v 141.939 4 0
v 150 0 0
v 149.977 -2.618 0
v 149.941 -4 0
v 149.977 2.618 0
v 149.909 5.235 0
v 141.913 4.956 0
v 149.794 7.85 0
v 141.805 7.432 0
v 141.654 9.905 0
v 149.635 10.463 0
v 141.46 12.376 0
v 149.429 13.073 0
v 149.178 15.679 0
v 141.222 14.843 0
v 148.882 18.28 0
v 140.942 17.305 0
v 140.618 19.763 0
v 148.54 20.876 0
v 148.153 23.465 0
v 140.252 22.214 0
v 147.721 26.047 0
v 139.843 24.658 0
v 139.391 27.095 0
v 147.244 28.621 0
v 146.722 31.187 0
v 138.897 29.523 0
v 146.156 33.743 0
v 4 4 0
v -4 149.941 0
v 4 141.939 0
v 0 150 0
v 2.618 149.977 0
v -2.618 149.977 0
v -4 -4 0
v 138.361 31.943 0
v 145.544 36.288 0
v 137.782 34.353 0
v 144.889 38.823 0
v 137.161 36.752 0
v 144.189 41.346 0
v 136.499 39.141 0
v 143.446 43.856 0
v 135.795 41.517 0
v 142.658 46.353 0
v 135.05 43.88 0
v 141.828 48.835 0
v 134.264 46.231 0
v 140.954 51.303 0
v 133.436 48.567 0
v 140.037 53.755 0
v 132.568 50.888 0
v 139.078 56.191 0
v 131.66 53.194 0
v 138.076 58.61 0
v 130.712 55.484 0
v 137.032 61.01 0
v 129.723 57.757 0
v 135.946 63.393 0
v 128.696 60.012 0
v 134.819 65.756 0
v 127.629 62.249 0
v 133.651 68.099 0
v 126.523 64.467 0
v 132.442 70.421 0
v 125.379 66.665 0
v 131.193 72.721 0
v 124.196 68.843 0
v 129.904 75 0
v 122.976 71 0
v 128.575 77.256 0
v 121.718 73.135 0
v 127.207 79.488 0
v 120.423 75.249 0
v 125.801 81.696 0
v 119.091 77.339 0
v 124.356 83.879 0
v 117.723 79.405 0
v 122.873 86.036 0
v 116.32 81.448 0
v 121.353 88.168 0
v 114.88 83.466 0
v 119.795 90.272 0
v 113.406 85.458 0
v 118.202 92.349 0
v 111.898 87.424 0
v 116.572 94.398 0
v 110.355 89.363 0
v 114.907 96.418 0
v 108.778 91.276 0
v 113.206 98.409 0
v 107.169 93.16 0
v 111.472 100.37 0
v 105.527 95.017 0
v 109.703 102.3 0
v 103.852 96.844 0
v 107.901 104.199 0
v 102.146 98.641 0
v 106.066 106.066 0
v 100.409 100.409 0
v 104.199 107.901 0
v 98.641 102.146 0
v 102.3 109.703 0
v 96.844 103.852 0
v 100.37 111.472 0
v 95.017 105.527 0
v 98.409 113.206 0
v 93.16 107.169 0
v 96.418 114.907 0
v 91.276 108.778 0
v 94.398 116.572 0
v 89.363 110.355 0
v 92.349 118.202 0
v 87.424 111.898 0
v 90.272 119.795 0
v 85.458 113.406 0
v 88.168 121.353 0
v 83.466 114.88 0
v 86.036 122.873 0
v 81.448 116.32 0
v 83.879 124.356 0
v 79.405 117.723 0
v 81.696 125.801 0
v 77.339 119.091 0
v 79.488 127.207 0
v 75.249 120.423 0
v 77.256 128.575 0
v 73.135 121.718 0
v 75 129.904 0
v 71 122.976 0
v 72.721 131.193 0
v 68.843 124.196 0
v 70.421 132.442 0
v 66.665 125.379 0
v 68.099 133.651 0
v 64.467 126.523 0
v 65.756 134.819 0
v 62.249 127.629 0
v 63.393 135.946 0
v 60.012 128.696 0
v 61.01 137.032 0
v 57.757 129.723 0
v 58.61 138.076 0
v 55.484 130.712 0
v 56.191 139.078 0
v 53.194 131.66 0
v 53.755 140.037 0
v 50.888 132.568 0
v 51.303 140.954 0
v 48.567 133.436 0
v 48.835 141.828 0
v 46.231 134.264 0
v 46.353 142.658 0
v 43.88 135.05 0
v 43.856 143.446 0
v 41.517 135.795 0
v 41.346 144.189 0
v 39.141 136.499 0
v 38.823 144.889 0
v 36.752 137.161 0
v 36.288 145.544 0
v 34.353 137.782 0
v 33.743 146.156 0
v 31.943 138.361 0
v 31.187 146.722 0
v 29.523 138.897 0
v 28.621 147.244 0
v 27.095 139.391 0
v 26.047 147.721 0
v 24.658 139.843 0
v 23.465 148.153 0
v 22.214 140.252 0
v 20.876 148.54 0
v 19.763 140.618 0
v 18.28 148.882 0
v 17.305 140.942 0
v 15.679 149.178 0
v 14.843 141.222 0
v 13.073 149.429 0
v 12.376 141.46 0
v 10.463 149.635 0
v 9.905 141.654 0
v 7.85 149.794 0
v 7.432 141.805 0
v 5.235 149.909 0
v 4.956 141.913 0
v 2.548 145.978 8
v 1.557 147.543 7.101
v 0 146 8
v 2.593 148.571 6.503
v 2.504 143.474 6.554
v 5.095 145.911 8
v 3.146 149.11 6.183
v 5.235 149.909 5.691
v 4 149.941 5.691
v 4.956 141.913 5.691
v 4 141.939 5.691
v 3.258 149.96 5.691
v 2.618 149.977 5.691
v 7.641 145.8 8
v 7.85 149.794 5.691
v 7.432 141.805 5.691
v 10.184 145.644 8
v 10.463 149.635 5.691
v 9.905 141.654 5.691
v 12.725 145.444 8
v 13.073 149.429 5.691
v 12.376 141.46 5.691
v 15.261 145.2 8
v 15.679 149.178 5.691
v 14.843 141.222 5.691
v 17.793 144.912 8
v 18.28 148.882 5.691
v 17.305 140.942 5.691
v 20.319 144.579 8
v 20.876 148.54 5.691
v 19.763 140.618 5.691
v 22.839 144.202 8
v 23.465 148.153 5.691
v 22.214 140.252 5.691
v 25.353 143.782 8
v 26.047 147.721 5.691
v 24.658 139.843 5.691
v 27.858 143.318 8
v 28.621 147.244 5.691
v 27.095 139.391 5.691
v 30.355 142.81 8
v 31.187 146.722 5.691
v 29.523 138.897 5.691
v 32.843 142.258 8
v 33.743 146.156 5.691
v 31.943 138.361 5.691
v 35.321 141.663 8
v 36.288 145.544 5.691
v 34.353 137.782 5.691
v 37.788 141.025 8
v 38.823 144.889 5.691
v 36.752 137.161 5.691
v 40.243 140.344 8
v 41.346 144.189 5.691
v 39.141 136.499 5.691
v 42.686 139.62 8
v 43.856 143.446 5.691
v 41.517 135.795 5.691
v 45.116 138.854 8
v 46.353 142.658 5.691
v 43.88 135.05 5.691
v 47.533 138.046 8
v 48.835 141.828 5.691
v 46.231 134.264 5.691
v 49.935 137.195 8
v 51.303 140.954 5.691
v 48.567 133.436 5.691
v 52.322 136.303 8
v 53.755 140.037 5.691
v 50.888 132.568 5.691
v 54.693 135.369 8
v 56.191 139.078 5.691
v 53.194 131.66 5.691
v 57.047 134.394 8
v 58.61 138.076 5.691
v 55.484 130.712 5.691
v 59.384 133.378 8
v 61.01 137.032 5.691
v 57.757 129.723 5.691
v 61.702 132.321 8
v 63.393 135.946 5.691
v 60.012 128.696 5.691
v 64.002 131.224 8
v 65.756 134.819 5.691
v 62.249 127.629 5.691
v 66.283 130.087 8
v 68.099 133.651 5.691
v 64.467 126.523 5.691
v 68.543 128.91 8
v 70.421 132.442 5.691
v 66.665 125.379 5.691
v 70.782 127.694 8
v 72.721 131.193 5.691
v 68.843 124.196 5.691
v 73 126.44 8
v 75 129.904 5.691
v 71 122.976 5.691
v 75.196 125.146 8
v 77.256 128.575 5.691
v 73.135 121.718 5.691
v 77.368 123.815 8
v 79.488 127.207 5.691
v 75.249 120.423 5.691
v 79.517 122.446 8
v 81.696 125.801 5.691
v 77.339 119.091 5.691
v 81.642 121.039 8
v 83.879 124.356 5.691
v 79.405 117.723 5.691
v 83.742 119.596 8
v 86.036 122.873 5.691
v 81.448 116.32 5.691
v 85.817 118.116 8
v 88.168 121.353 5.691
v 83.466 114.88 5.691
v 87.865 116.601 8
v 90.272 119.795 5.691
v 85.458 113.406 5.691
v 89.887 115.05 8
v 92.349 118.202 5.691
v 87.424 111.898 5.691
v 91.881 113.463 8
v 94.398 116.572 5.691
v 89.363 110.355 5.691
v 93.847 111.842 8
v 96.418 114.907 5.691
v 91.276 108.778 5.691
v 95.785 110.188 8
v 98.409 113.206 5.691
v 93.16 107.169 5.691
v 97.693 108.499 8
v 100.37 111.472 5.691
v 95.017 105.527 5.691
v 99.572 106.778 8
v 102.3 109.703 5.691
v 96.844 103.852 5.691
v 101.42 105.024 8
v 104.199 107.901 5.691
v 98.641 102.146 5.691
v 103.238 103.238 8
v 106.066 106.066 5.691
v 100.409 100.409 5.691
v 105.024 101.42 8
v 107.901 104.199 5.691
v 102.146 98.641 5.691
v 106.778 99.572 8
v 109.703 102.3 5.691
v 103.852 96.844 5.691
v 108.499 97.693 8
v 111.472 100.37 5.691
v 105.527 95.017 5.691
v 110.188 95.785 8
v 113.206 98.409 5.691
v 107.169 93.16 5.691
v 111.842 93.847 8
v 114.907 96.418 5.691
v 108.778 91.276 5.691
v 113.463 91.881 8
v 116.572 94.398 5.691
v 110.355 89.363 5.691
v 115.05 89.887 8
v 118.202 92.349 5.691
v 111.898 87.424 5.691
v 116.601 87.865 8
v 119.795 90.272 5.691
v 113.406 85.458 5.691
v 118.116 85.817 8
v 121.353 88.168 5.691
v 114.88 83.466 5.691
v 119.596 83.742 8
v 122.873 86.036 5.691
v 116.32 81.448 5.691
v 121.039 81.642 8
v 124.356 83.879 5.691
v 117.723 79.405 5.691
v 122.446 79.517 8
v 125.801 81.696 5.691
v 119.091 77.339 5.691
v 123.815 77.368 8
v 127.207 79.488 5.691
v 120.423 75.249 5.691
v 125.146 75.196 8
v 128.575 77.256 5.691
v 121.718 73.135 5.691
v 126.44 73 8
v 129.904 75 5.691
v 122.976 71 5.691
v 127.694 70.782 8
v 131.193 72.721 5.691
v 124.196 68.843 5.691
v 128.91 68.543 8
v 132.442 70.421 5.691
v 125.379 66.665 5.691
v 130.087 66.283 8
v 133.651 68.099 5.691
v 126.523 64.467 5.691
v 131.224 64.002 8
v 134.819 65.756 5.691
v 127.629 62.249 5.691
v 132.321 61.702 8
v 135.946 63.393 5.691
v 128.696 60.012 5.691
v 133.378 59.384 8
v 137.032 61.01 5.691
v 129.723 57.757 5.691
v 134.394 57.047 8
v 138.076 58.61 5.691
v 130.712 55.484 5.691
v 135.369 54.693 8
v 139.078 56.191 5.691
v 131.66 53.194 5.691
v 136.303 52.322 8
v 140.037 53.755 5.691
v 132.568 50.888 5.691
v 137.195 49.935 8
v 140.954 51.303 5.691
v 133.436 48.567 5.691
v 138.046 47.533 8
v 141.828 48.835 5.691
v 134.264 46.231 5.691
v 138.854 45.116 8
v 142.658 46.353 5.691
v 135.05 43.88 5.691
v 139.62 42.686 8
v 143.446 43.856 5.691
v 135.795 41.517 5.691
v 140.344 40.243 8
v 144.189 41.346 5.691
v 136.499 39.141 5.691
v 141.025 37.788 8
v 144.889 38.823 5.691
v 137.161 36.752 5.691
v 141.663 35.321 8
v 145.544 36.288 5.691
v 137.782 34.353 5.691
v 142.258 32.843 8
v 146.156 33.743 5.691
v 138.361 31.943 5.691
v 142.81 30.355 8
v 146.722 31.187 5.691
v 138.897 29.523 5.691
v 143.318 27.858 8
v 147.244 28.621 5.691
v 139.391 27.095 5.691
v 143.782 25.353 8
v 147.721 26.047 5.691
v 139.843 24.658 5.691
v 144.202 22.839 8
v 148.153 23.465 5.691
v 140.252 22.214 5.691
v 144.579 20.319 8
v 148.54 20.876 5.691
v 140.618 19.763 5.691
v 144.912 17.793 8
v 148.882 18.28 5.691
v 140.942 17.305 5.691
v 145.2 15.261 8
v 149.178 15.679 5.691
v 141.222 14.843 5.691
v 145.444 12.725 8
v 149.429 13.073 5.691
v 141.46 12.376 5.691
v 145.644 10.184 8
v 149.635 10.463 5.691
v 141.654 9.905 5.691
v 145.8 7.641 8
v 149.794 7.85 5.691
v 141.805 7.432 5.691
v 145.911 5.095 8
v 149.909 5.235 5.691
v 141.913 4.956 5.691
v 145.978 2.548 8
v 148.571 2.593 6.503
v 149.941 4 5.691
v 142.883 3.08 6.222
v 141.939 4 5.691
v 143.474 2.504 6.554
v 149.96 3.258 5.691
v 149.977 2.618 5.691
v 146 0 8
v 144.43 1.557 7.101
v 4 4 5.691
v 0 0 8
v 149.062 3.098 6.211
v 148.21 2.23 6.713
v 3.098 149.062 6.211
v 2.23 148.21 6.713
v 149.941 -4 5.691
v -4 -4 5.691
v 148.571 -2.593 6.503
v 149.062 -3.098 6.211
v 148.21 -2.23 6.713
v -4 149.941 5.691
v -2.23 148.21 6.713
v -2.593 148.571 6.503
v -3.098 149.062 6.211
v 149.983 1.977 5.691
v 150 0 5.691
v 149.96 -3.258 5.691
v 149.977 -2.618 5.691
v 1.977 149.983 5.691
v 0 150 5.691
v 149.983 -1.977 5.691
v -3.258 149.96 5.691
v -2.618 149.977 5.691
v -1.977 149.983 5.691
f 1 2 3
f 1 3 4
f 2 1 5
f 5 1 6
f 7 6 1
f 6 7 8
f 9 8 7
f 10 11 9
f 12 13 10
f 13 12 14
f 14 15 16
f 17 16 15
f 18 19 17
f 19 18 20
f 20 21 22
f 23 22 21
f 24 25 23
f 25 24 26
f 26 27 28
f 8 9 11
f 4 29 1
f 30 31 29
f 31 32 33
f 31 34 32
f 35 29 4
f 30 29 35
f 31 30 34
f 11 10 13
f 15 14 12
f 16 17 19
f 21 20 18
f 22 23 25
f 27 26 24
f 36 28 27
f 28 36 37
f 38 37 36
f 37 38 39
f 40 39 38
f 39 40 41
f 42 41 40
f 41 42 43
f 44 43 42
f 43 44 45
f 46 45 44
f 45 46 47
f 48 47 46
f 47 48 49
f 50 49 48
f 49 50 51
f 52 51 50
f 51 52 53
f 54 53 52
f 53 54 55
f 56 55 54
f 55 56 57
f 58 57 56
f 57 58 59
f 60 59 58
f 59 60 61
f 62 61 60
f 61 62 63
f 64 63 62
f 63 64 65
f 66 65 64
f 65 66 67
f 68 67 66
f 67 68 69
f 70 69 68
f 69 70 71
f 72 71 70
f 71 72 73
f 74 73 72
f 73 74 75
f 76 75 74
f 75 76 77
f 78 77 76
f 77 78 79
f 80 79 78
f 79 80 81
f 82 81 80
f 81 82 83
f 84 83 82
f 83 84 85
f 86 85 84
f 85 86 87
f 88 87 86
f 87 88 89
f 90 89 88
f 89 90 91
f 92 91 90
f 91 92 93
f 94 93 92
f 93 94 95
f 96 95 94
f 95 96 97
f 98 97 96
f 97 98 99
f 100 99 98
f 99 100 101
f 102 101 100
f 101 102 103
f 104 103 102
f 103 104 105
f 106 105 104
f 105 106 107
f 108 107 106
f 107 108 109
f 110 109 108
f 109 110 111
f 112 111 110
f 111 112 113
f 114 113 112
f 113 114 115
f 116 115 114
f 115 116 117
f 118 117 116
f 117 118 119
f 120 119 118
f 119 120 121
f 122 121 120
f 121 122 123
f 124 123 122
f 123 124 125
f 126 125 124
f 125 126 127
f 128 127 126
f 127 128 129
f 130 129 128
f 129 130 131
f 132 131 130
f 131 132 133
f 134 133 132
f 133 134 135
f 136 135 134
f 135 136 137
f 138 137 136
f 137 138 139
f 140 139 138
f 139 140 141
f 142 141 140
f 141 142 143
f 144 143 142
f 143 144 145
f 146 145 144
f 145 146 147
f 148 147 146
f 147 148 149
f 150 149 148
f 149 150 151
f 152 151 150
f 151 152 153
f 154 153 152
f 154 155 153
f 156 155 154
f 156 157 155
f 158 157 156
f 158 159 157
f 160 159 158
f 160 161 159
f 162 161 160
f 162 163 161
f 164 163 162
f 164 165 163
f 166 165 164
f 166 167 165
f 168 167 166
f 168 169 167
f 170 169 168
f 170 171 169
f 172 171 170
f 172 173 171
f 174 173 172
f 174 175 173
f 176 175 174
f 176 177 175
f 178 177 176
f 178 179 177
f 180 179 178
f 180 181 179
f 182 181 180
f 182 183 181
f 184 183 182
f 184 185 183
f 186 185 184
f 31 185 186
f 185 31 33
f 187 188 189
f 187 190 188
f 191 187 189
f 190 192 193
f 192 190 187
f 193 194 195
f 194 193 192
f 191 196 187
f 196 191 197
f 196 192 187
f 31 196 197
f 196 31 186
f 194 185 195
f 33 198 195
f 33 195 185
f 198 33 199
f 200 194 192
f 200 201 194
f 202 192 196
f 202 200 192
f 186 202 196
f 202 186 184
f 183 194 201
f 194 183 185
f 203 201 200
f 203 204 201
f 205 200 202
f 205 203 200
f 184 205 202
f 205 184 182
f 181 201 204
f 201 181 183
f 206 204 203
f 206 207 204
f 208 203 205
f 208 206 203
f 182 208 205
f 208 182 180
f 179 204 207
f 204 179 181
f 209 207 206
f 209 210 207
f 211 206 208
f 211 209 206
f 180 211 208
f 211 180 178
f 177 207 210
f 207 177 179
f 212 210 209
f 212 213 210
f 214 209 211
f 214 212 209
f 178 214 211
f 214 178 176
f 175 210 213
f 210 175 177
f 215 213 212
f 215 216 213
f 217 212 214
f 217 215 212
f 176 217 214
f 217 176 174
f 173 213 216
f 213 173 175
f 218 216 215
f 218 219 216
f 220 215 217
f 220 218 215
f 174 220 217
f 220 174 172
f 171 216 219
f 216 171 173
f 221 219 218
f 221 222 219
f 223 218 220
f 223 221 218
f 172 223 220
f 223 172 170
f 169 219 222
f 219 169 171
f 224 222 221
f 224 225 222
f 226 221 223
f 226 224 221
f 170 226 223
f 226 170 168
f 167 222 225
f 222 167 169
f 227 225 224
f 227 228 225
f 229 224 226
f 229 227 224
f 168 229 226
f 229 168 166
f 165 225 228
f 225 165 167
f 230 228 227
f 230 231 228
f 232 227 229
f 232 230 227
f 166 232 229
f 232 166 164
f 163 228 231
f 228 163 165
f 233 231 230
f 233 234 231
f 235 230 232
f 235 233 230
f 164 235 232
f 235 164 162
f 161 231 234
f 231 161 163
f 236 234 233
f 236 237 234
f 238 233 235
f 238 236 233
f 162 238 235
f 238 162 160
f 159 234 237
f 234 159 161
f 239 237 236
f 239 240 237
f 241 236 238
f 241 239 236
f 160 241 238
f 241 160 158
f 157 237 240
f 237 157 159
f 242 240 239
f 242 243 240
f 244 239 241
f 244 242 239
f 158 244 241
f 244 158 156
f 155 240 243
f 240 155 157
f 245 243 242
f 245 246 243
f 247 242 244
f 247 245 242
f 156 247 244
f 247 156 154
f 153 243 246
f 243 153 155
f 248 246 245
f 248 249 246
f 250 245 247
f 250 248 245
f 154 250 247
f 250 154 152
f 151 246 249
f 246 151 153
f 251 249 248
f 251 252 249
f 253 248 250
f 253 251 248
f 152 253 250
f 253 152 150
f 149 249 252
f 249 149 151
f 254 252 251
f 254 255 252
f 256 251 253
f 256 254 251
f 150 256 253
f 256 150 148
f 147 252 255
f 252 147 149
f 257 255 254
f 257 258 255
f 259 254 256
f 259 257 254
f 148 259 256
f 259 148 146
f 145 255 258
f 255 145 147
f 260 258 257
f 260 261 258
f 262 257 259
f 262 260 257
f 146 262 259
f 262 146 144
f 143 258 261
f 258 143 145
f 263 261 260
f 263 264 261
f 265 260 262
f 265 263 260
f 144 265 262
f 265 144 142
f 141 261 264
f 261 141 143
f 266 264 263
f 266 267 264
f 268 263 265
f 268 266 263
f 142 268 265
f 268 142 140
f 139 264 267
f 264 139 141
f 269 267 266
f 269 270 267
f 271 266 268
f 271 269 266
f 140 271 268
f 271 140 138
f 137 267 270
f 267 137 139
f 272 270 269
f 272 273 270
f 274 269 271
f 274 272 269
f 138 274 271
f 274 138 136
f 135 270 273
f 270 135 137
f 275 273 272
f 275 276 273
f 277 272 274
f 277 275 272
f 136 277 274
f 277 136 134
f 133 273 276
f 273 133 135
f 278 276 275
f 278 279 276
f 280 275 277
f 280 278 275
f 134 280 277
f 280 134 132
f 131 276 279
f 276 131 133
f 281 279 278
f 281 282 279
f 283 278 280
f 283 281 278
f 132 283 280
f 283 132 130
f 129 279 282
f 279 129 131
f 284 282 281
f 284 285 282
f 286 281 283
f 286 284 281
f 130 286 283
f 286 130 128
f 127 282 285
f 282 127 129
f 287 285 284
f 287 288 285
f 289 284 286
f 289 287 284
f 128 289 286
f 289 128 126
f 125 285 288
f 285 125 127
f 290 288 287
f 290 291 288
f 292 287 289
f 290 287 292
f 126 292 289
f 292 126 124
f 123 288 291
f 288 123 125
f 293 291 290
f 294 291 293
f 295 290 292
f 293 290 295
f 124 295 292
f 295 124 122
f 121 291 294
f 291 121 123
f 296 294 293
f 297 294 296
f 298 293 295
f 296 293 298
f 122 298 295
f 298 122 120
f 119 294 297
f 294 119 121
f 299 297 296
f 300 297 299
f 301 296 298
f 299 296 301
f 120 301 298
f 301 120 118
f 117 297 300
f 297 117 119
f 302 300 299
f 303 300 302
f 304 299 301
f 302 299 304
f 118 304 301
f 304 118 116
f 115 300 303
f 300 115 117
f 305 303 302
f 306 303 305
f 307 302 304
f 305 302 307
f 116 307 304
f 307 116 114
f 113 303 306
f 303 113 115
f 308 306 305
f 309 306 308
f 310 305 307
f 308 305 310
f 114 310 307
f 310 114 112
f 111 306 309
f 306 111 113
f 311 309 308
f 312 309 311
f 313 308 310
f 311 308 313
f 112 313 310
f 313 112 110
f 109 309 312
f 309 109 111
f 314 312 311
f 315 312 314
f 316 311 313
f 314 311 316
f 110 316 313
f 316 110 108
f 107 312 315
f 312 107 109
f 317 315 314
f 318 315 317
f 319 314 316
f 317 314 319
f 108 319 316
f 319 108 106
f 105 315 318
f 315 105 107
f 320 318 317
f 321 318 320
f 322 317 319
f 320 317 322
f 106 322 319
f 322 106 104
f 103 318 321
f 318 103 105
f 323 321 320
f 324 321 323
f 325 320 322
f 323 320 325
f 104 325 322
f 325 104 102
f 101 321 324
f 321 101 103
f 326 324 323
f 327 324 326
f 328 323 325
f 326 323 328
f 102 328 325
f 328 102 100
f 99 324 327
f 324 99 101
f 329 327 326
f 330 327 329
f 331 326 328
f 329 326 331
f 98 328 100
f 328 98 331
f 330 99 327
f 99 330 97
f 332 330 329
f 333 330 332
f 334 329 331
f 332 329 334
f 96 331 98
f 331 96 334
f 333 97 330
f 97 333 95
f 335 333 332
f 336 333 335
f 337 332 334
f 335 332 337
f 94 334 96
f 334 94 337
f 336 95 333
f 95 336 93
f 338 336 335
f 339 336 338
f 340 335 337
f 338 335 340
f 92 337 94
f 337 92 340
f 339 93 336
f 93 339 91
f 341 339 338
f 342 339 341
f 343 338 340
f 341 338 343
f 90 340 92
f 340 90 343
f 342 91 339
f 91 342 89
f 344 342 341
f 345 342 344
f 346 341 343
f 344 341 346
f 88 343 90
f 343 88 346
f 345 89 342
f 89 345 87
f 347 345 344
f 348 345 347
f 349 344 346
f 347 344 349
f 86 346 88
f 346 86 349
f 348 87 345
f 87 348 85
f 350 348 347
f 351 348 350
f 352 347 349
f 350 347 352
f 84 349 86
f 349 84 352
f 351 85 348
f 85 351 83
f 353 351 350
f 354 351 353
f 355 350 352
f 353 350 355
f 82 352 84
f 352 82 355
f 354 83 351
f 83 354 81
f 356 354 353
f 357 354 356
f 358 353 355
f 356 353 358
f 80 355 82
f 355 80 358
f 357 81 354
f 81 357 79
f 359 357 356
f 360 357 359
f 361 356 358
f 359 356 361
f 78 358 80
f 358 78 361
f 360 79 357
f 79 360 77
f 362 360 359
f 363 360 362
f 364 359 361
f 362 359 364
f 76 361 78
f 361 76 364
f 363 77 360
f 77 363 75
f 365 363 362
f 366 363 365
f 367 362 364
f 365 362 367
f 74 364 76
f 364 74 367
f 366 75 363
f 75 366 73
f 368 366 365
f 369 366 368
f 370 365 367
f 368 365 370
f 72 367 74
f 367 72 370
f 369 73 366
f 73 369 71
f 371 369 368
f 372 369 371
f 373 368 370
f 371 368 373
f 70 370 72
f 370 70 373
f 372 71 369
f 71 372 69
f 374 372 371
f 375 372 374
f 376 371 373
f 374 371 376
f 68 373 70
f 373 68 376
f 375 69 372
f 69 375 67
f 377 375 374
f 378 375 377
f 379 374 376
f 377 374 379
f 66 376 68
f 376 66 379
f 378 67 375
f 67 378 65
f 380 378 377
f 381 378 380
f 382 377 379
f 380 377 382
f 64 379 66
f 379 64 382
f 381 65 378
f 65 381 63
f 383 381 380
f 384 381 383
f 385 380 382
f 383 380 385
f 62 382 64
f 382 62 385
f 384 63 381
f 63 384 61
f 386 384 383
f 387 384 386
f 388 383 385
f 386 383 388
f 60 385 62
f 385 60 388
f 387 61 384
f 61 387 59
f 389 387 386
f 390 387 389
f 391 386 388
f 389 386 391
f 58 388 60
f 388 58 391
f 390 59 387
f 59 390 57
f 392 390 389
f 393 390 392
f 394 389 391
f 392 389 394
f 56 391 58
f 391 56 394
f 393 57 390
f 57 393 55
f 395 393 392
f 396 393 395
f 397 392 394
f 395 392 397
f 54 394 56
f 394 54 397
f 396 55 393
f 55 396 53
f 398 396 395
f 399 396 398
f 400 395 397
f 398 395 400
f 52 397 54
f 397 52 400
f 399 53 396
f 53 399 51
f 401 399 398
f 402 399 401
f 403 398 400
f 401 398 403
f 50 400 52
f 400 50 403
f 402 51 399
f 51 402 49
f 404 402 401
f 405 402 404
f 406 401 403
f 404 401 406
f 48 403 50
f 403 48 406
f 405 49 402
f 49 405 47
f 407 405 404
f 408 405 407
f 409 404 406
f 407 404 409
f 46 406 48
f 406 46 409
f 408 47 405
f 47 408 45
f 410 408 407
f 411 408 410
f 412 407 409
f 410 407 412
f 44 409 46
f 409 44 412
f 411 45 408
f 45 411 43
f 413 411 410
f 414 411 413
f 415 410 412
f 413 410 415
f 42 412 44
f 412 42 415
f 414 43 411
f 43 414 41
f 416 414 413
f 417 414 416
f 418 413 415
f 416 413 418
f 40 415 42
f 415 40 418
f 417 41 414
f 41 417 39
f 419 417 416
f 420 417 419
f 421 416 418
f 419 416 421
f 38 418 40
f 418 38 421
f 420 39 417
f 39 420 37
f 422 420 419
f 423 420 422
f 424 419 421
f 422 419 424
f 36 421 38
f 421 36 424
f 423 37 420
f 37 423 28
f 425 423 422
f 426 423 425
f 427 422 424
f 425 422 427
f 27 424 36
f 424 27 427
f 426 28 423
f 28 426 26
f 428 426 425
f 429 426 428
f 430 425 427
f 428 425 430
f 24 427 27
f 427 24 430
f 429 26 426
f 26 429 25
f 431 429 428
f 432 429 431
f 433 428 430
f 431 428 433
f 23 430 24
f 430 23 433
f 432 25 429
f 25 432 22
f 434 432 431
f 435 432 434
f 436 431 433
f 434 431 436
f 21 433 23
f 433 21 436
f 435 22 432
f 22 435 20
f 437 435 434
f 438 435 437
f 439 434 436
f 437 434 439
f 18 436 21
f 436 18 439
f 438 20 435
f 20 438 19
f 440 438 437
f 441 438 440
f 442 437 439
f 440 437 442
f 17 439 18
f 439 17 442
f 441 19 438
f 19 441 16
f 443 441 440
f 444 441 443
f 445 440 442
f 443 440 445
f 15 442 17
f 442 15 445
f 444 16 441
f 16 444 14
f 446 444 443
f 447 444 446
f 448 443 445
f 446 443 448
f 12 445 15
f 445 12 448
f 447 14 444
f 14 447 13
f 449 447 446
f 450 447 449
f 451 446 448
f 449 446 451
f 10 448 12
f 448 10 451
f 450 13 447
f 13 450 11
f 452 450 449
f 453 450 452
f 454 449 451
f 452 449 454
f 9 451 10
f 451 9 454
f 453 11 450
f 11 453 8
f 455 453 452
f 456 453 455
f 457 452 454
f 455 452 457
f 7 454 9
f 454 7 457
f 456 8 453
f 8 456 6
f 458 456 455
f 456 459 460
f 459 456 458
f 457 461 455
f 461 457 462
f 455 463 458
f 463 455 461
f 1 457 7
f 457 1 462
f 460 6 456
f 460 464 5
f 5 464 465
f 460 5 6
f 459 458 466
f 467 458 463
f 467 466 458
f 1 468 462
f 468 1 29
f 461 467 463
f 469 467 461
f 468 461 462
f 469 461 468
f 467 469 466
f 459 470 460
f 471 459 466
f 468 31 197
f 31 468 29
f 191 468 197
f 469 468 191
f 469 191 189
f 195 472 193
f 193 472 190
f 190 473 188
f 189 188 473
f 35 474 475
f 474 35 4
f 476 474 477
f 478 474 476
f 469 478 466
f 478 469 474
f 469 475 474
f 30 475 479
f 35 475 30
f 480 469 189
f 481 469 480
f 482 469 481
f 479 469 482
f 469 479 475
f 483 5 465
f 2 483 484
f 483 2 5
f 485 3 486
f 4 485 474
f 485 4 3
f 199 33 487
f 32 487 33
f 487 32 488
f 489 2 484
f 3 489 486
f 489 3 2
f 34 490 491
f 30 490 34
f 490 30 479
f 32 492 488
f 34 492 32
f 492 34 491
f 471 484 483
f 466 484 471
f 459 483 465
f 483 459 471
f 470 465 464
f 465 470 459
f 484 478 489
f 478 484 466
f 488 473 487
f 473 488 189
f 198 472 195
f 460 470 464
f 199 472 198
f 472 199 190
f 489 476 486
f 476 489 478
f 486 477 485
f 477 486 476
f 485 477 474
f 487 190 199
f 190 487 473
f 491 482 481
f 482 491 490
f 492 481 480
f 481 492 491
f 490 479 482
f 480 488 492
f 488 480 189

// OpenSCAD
// Angled floating plant ring with a shaped cross-section.

// ---------- Public parameters (mm) ----------
ring_outer_diameter = 300;
cross_section_width = 8;
cross_section_total_height = 8;
top_angle = 30; // Angle of top surfaces in degrees.
ring_angle = 90; // Ring sweep in degrees (360 full, 180 half, 90 quarter).

// ---------- Resolution ----------
$fa = 1;
$fs = 1;

// ---------- Derived ----------
// Calculate inner diameter.
ring_inner_diameter = ring_outer_diameter - (2 * cross_section_width);
// Inner and outer radii.
ring_inner_radius = ring_inner_diameter / 2;
ring_outer_radius = ring_outer_diameter / 2;
// Center of cross-section (middle of wall thickness).
ring_center_radius = (ring_inner_radius + ring_outer_radius) / 2;
// Radius used to clip the angled sector (slightly larger than outer radius).
sector_radius = ring_outer_radius + 1;
// Extra height to guarantee the clipping solid fully covers the ring.
sector_height = cross_section_total_height + 1;
sector_step = 5; // Degrees per segment for the clipping sector arc.
side_extension = cross_section_width * 2;
side_length = ring_outer_radius + side_extension;
radial_side_extra = 0.1;

// Calculate triangle and rectangle heights from total height and angle.
// Triangle height = tan(angle) * (width / 2).
triangle_height = tan(top_angle) * (cross_section_width / 2);
rectangle_height = cross_section_total_height - triangle_height;

module cross_section() {
    // Create the cross-section: rectangle base + triangle top
    // Rectangle extends from inner to outer radius
    // Triangle is centered on top with peak at middle of cross-section
    polygon(points = [
        // Bottom-left (inner radius, bottom)
        [ring_inner_radius, 0],
        // Bottom-right (outer radius, bottom)
        [ring_outer_radius, 0],
        // Top-right (outer radius, top of rectangle)
        [ring_outer_radius, rectangle_height],
        // Top-center (middle of cross-section, peak of triangle)
        [ring_center_radius, cross_section_total_height],
        // Top-left (inner radius, top of rectangle)
        [ring_inner_radius, rectangle_height]
    ]);
}

module side_profile() {
    polygon(points = [
        // Bottom-left
        [0, 0],
        // Bottom-right
        [cross_section_width, 0],
        // Top-right (top of rectangle)
        [cross_section_width, rectangle_height],
        // Top-center (peak of triangle)
        [cross_section_width / 2, cross_section_total_height],
        // Top-left (top of rectangle)
        [0, rectangle_height]
    ]);
}

module radial_side_profile() {
    // Slightly oversized for cleanup subtraction.
    // Expand only the outer face (positive X) to avoid shifting inner face.
    polygon(points = [
        // Bottom-left
        [0, 0],
        // Bottom-right
        [cross_section_width * 2, 0],
        // Top-right (top of rectangle)
        [cross_section_width * 2, cross_section_total_height],
        // Top-center (peak of triangle)
        [cross_section_width / 2, cross_section_total_height],
        // Top-left (top of rectangle)
        [0, rectangle_height]
    ]);
}

module angled_floating_ring_cleaned(angle = ring_angle) {
    intersection() {
        intersection() {
            difference() {
                angled_floating_ring_union(angle);
                first_radial_vertical_cleanup_volume();
                first_radial_angled_top_cleanup_volume();
                second_radial_vertical_cleanup_volume();
                second_radial_angled_top_cleanup_volume();
            }
            outer_arc_vertical_cleanup_volume();
        }
        outer_arc_angled_top_cleanup_volume();
    }
}

module angled_floating_ring_union(angle = ring_angle) {
    union() {
        ring_slice(angle);
        radial_side(length = side_length, side_angle = 0, reflect = true);
        rotate([0, 0, angle])
            radial_side(length = side_length, side_angle = angle);
    }
}

module full_ring() {
    rotate_extrude(angle = 360) {
        cross_section();
    }
}

module ring_slice(angle = ring_angle) {
    intersection() {
        full_ring();
        ring_sector(angle);
    }
}

module ring_sector(angle = ring_angle) {
    translate([0, 0, -0.5]) {
        linear_extrude(height = sector_height) {
            sector_2d(sector_radius, angle, sector_step);
        }
    }
}

module radial_side(length = ring_outer_radius, side_angle = 0, reflect = false) {
    // Extrude the same profile along the radius to create a straight side.
    rotate([0, 90, 0])
    rotate([0, 0, 90])
          if (reflect)
            mirror([1, 0, 0])
            translate([-cross_section_width / 2, 0, -side_extension])
              linear_extrude(height = length) {
                  radial_side_profile();
              }
          else
            translate([-cross_section_width / 2, 0, -side_extension])
            linear_extrude(height = length) {
                radial_side_profile();
            }
}


module first_radial_vertical_cleanup_volume() {
    // Large slab aligned to the first radial side (side_angle = 0).
    translate([-ring_outer_radius, -ring_outer_radius - cross_section_width / 2, -cross_section_total_height])
      cube([ring_outer_diameter, ring_outer_radius, cross_section_total_height * 3]);
}

module first_radial_angled_top_cleanup_volume() {
    // Large angled slab aligned to the first radial side (side_angle = 0).
    translate([0, 0, cross_section_total_height])
    rotate([top_angle - 90, 0, 0])
      translate([-ring_outer_radius, -ring_outer_radius, -cross_section_total_height])
        cube([ring_outer_diameter, ring_outer_radius, cross_section_total_height * 3]);
}

module second_radial_vertical_cleanup_volume() {
    rotate([0, 0, ring_angle])
      translate([-ring_outer_radius, cross_section_width / 2, -cross_section_total_height])
        cube([ring_outer_diameter, ring_outer_radius, cross_section_total_height * 3]);
}

module second_radial_angled_top_cleanup_volume() {
    // Large angled slab aligned to the second radial side (side_angle = ring_angle).
    rotate([0, 0, ring_angle])
      translate([0, 0, cross_section_total_height])
        rotate([-90 - top_angle, 0, 0])
          translate([-ring_outer_radius, -ring_outer_radius, -cross_section_total_height])
            cube([ring_outer_diameter, ring_outer_radius, cross_section_total_height * 3]);
}

module sector_2d(radius, angle, step) {
    polygon(points = concat(
        [[0, 0]],
        [for (a = [0 : step : angle]) [radius * cos(a), radius * sin(a)]],
        [[0, 0]]
    ));
}

// angled_floating_ring_union();
angled_floating_ring_cleaned();


module outer_arc_vertical_cleanup_volume() {
    translate([0, 0, cross_section_total_height / 2])
        cylinder(h = cross_section_total_height * 3, r = ring_outer_radius, center = true);
}

module outer_arc_angled_top_cleanup_volume() {
    // Cone matching the outer angled top surface.
    extra_height = cross_section_total_height;
    slope = (ring_outer_radius - ring_center_radius) / triangle_height;
    total_height = triangle_height + extra_height;
    bottom_radius = ring_center_radius + (slope * total_height);
    translate([0, 0, rectangle_height - extra_height])
        cylinder(h = total_height, r1 = bottom_radius, r2 = ring_center_radius);
}
